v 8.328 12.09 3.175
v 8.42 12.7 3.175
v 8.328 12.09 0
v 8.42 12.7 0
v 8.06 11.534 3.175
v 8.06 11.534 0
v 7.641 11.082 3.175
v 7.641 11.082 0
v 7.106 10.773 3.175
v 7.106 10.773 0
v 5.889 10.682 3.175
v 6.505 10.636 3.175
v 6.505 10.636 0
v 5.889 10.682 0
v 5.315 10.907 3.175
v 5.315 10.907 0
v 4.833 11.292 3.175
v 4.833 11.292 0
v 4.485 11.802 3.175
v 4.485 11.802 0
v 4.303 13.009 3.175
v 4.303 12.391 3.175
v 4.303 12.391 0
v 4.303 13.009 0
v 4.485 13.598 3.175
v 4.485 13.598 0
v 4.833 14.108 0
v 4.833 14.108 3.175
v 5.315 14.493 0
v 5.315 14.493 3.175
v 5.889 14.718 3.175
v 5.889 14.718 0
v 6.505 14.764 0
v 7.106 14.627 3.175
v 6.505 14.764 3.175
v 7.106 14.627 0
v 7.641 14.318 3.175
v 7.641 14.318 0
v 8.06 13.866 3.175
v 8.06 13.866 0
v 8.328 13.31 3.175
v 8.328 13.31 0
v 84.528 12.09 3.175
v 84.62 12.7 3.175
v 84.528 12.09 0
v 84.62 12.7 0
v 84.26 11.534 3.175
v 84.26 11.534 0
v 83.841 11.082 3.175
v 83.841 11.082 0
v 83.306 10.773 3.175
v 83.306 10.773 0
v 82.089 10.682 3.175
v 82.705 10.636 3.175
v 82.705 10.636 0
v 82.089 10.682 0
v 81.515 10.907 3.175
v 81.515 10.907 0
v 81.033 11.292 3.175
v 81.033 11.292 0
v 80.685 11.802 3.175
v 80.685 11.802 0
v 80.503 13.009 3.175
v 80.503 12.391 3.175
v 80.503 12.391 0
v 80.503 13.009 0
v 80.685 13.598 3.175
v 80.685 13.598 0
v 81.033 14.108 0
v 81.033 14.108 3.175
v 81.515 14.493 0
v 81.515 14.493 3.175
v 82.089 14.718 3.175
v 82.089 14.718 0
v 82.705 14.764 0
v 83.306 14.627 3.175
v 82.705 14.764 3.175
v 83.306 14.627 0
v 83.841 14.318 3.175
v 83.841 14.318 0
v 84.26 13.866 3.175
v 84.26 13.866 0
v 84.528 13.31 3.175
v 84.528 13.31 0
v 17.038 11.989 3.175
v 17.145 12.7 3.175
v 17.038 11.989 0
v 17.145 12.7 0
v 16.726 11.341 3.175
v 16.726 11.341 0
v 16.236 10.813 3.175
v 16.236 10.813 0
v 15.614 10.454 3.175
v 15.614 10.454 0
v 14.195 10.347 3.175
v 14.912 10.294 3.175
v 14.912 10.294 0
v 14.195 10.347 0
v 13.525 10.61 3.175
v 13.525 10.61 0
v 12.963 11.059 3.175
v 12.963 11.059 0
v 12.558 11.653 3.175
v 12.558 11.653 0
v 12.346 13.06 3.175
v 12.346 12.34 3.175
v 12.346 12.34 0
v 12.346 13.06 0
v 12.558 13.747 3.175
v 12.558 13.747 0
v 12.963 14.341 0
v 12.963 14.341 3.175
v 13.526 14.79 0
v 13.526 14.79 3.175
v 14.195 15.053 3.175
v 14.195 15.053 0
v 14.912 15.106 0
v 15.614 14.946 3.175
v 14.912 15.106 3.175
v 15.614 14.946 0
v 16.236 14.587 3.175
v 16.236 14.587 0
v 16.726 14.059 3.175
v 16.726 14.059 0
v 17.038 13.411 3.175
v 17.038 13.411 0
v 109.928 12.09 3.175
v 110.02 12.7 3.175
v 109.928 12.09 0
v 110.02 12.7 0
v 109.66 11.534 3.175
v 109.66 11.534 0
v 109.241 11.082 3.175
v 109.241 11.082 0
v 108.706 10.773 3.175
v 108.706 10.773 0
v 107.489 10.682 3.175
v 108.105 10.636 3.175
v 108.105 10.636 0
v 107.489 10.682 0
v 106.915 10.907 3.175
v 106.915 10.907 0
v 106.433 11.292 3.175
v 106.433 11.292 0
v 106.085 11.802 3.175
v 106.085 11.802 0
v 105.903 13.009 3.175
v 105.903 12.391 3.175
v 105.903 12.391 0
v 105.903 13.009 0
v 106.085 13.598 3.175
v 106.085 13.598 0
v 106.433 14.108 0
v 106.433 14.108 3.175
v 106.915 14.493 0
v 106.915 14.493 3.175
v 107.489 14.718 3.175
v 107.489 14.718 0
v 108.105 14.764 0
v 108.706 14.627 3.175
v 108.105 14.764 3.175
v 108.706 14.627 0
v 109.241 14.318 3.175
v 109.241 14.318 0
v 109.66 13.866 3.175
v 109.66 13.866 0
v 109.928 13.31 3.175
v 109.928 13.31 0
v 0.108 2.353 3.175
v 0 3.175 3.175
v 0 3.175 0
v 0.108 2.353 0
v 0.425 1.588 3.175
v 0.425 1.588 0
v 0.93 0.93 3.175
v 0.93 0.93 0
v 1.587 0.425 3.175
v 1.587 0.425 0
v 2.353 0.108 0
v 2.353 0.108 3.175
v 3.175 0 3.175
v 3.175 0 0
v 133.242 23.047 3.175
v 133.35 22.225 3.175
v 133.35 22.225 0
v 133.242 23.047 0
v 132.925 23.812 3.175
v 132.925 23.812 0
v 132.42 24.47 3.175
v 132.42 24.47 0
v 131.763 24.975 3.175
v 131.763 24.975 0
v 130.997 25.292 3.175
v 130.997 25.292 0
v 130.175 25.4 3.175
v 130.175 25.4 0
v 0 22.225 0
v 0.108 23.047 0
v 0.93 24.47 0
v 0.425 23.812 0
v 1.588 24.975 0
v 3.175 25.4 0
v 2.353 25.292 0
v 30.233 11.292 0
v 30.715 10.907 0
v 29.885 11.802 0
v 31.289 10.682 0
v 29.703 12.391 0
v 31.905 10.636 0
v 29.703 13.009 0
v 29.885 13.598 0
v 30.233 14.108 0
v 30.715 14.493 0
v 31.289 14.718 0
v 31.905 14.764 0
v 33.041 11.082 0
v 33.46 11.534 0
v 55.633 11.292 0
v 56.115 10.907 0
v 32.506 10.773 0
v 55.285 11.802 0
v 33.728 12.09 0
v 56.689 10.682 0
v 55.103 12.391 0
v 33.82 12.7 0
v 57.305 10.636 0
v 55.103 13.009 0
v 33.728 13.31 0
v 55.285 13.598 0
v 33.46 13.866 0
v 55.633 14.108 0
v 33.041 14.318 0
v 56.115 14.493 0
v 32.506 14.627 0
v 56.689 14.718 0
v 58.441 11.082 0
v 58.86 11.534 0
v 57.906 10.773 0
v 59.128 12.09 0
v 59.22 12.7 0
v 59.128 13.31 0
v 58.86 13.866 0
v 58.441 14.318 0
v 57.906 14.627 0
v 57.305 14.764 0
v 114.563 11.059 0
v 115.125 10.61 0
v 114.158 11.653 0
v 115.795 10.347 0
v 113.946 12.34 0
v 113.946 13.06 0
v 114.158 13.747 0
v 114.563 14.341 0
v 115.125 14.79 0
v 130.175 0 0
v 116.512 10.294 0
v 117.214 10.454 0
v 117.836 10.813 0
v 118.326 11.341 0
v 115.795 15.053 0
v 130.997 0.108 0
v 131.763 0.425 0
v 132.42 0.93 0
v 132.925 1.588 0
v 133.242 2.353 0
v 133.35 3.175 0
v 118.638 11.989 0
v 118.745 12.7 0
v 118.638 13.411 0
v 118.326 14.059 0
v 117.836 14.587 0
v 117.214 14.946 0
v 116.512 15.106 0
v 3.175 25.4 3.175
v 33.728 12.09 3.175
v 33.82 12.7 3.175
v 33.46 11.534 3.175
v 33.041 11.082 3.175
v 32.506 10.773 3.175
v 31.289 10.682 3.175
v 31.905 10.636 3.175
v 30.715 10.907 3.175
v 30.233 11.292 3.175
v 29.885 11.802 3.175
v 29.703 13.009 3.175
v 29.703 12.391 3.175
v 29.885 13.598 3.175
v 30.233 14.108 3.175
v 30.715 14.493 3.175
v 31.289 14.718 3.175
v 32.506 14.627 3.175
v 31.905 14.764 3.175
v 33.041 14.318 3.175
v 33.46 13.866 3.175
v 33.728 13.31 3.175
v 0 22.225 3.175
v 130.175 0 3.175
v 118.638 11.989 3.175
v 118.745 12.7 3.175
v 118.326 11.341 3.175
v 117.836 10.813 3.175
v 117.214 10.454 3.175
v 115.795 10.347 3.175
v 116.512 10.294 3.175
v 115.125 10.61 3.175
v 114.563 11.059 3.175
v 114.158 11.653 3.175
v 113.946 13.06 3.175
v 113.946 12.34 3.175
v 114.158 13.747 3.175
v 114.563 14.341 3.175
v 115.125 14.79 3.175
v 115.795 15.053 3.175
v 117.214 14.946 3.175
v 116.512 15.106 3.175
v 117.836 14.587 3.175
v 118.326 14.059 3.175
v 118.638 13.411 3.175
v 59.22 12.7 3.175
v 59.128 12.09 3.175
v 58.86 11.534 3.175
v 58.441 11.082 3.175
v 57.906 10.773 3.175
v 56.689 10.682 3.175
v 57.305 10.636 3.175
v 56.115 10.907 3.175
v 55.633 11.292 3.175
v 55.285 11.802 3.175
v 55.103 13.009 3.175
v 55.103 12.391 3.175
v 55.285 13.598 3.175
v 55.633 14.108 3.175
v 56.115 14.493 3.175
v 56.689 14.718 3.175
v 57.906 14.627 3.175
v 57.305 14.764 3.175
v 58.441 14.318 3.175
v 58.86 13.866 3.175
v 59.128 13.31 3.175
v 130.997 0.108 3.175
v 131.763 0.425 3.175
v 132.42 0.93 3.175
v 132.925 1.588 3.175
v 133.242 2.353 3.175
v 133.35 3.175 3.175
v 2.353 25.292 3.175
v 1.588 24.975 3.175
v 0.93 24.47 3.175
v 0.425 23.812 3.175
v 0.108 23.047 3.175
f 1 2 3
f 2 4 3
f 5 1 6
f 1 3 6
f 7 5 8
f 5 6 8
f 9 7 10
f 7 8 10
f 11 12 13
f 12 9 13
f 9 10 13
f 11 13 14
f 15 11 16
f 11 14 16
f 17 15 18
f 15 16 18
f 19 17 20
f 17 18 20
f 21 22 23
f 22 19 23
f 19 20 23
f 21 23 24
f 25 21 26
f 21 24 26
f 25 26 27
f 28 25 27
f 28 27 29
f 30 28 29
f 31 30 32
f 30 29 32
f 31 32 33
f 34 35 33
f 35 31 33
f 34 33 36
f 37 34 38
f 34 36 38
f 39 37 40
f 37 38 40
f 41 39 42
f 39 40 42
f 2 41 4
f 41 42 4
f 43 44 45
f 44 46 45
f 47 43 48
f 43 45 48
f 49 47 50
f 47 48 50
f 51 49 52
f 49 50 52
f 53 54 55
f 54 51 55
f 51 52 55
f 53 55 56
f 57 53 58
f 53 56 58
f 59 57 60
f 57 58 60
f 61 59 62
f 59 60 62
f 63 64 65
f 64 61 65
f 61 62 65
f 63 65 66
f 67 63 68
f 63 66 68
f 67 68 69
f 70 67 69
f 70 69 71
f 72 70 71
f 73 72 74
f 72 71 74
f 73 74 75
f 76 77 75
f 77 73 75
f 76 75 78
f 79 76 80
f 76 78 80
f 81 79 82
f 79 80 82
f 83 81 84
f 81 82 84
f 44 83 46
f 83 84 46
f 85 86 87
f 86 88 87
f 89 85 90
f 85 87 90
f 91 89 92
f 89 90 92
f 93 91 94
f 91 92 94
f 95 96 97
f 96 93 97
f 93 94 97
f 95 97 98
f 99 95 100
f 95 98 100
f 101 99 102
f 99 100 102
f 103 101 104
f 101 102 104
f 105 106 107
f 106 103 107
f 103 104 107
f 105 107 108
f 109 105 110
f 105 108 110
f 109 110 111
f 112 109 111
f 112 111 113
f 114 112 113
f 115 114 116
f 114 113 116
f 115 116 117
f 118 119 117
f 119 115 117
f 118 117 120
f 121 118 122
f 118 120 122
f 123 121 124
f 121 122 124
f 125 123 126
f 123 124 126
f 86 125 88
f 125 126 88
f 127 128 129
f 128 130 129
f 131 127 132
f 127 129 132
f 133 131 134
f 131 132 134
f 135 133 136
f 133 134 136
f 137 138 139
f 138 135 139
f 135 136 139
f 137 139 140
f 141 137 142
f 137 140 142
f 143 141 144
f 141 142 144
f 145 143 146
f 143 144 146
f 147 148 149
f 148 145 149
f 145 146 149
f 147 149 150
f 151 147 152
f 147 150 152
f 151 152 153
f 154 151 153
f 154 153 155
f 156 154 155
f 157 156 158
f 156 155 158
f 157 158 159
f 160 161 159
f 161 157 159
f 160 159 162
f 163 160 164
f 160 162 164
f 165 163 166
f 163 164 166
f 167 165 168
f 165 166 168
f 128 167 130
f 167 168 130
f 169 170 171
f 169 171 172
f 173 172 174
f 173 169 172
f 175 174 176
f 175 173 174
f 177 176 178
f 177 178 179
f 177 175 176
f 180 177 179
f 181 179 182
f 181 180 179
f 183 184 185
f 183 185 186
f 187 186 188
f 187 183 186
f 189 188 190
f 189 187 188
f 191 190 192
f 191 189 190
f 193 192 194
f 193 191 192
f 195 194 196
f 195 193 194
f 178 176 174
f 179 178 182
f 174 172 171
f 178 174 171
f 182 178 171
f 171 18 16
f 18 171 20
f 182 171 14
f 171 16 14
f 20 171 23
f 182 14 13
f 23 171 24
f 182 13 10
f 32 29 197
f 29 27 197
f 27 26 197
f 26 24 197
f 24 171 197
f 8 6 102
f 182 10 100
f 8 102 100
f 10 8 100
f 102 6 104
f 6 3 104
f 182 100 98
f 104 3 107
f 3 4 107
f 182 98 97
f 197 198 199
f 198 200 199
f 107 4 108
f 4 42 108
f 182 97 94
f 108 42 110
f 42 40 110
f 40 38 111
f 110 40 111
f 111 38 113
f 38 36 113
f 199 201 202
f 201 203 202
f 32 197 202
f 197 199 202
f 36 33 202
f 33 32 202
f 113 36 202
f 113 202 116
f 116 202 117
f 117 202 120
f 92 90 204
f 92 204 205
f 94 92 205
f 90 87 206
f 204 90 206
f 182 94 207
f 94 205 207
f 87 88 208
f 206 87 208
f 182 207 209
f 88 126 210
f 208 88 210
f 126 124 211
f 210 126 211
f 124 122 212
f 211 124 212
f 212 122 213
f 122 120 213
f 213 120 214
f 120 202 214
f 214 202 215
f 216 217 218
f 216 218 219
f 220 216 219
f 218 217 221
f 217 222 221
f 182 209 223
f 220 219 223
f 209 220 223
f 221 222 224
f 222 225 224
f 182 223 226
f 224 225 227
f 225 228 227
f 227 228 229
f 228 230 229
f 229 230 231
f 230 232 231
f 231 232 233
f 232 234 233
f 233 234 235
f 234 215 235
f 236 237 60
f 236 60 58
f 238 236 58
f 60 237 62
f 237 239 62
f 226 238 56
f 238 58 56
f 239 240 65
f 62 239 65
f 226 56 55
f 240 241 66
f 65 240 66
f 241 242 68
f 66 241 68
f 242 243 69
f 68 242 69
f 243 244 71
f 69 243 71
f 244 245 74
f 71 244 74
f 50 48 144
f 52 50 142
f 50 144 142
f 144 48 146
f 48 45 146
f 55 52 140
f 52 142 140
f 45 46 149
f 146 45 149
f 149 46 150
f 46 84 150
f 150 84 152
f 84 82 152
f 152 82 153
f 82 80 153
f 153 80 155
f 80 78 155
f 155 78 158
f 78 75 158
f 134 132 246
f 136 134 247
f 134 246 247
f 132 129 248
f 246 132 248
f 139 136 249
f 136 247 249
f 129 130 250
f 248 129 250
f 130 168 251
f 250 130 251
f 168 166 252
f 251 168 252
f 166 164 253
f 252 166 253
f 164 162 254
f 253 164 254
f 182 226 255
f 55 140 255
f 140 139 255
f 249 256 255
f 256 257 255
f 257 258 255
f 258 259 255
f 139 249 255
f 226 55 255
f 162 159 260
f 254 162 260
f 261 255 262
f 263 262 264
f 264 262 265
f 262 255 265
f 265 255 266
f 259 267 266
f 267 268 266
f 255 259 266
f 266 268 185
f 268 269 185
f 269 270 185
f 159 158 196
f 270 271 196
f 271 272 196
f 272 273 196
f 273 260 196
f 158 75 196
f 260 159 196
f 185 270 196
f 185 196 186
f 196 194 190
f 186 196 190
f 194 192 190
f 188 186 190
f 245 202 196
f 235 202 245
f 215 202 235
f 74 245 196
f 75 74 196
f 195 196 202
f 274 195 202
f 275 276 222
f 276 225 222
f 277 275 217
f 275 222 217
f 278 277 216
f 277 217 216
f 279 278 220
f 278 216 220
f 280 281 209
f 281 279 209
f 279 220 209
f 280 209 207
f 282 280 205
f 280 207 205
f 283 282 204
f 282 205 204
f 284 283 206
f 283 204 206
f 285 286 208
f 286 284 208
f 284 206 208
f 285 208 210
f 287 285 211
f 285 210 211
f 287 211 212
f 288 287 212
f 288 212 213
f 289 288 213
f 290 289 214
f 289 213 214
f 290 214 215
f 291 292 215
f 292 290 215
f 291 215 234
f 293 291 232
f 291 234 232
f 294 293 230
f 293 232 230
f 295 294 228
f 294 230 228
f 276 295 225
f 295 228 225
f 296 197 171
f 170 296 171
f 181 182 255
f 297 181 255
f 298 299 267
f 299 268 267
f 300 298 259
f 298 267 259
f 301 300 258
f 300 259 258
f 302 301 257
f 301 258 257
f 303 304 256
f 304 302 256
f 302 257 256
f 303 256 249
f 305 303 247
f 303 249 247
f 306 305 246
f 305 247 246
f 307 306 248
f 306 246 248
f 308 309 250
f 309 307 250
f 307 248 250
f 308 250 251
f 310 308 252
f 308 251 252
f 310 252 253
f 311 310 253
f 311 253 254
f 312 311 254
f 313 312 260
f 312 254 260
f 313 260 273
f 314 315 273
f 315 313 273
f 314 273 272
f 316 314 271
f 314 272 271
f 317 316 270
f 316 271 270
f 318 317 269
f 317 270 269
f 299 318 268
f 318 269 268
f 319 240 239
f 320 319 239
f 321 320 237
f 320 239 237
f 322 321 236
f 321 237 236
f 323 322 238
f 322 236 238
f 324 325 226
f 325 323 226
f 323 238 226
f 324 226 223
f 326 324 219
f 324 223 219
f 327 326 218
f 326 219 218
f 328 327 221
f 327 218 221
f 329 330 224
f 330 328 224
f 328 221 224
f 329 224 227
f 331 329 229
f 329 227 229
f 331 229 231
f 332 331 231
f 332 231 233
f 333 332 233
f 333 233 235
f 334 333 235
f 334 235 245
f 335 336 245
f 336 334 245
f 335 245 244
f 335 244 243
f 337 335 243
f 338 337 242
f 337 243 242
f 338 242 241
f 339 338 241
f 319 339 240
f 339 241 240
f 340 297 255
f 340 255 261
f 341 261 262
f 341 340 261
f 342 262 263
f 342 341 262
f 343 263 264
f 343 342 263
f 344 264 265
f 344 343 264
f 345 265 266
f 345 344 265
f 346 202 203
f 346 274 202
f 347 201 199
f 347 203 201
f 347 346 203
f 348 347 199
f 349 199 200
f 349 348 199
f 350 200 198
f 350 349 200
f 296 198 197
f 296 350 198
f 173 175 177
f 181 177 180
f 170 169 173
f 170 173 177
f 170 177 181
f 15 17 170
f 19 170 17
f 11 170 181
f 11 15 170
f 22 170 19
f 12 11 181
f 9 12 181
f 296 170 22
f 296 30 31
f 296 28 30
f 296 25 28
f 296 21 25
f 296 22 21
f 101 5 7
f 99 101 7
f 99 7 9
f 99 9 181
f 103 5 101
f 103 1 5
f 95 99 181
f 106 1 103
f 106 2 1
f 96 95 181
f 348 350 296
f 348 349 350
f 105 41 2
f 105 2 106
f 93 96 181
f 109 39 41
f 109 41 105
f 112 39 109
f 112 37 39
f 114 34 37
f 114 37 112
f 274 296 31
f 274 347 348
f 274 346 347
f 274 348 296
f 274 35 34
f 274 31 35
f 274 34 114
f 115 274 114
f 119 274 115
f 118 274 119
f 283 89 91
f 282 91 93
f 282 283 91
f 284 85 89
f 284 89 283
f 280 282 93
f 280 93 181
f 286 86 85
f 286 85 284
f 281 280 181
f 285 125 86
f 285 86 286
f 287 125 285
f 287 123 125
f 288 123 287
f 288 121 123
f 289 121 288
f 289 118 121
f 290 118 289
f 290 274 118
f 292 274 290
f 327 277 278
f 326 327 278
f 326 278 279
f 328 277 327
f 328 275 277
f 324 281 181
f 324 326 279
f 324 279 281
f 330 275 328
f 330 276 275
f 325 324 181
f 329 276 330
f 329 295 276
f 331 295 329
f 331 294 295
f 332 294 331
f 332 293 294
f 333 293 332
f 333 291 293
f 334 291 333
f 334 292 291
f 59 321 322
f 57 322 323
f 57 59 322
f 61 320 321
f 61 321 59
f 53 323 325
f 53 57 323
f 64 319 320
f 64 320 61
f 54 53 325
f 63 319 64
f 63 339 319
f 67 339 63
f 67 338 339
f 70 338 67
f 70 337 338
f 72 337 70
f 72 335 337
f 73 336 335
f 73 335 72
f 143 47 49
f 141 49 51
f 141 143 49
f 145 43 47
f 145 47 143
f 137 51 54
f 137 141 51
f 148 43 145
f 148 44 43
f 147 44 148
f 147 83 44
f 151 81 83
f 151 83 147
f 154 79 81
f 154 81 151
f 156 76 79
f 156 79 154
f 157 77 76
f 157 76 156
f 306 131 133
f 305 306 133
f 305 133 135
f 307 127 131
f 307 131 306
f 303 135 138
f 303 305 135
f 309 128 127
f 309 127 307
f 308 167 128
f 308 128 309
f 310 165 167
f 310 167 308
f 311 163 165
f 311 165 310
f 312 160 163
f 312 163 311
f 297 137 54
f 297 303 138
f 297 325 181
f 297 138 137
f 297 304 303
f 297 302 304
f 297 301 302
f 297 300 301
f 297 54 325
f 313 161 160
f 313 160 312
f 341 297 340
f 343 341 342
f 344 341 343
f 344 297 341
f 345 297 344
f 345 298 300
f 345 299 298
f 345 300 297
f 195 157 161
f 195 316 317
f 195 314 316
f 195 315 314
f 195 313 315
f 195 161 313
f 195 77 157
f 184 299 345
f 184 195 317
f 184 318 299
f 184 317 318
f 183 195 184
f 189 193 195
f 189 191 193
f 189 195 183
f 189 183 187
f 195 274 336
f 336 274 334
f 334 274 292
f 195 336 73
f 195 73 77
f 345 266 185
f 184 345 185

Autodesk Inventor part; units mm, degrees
ref_plane "YZ Plane" through (0, 0, 0) normal (1, 0, 0) x (0, 1, 0)
ref_plane "XZ Plane" through (0, 0, 0) normal (0, 1, 0) x (-1, 0, 0)
ref_plane "XY Plane" through (0, 0, 0) normal (0, 0, 1) x (1, 0, 0)
sketch "Sketch1" plane through (0, 0, 0) normal (0, 0, 1) x (1, 0, 0)
  line L0 (0, 0) -> (133.35, 0)
  line L1 (133.35, 0) -> (133.35, 25.4)
  line L2 (133.35, 25.4) -> (0, 25.4)
  line L3 (0, 25.4) -> (0, 0)
  circle A0 centre (6.35, 12.7) radius 2.0701
  circle A1 centre (31.75, 12.7) radius 2.0701
  circle A2 centre (57.15, 12.7) radius 2.0701
  circle A3 centre (82.55, 12.7) radius 2.0701
  circle A4 centre (107.95, 12.7) radius 2.0701
  circle A5 centre (116.332, 12.7) radius 2.413
  circle A6 centre (14.732, 12.7) radius 2.413
  dimension "d0" = 133.35
  dimension "d1" = 25.4
  dimension "d2" = 4.1402
  dimension "d3" = 12.7
  dimension "d4" = 6.35
  dimension "d7" = 25.4
  dimension "d12" = 4.826
  dimension "d15" = 101.6
  dimension "d21" = 8.382
  dimension "d22" = 12.7
extrude "Extrusion1" add sketch "Sketch1" along normal blind 3.175
fillet "Fillet1" radius 3.175 4 edges at (0, 25.4, 1.5875) (133.35, 25.4, 1.5875) (133.35, 0, 1.5875) (0, 0, 1.5875)
properties part number "Spacer for Belt" material "Aluminum 6061"
